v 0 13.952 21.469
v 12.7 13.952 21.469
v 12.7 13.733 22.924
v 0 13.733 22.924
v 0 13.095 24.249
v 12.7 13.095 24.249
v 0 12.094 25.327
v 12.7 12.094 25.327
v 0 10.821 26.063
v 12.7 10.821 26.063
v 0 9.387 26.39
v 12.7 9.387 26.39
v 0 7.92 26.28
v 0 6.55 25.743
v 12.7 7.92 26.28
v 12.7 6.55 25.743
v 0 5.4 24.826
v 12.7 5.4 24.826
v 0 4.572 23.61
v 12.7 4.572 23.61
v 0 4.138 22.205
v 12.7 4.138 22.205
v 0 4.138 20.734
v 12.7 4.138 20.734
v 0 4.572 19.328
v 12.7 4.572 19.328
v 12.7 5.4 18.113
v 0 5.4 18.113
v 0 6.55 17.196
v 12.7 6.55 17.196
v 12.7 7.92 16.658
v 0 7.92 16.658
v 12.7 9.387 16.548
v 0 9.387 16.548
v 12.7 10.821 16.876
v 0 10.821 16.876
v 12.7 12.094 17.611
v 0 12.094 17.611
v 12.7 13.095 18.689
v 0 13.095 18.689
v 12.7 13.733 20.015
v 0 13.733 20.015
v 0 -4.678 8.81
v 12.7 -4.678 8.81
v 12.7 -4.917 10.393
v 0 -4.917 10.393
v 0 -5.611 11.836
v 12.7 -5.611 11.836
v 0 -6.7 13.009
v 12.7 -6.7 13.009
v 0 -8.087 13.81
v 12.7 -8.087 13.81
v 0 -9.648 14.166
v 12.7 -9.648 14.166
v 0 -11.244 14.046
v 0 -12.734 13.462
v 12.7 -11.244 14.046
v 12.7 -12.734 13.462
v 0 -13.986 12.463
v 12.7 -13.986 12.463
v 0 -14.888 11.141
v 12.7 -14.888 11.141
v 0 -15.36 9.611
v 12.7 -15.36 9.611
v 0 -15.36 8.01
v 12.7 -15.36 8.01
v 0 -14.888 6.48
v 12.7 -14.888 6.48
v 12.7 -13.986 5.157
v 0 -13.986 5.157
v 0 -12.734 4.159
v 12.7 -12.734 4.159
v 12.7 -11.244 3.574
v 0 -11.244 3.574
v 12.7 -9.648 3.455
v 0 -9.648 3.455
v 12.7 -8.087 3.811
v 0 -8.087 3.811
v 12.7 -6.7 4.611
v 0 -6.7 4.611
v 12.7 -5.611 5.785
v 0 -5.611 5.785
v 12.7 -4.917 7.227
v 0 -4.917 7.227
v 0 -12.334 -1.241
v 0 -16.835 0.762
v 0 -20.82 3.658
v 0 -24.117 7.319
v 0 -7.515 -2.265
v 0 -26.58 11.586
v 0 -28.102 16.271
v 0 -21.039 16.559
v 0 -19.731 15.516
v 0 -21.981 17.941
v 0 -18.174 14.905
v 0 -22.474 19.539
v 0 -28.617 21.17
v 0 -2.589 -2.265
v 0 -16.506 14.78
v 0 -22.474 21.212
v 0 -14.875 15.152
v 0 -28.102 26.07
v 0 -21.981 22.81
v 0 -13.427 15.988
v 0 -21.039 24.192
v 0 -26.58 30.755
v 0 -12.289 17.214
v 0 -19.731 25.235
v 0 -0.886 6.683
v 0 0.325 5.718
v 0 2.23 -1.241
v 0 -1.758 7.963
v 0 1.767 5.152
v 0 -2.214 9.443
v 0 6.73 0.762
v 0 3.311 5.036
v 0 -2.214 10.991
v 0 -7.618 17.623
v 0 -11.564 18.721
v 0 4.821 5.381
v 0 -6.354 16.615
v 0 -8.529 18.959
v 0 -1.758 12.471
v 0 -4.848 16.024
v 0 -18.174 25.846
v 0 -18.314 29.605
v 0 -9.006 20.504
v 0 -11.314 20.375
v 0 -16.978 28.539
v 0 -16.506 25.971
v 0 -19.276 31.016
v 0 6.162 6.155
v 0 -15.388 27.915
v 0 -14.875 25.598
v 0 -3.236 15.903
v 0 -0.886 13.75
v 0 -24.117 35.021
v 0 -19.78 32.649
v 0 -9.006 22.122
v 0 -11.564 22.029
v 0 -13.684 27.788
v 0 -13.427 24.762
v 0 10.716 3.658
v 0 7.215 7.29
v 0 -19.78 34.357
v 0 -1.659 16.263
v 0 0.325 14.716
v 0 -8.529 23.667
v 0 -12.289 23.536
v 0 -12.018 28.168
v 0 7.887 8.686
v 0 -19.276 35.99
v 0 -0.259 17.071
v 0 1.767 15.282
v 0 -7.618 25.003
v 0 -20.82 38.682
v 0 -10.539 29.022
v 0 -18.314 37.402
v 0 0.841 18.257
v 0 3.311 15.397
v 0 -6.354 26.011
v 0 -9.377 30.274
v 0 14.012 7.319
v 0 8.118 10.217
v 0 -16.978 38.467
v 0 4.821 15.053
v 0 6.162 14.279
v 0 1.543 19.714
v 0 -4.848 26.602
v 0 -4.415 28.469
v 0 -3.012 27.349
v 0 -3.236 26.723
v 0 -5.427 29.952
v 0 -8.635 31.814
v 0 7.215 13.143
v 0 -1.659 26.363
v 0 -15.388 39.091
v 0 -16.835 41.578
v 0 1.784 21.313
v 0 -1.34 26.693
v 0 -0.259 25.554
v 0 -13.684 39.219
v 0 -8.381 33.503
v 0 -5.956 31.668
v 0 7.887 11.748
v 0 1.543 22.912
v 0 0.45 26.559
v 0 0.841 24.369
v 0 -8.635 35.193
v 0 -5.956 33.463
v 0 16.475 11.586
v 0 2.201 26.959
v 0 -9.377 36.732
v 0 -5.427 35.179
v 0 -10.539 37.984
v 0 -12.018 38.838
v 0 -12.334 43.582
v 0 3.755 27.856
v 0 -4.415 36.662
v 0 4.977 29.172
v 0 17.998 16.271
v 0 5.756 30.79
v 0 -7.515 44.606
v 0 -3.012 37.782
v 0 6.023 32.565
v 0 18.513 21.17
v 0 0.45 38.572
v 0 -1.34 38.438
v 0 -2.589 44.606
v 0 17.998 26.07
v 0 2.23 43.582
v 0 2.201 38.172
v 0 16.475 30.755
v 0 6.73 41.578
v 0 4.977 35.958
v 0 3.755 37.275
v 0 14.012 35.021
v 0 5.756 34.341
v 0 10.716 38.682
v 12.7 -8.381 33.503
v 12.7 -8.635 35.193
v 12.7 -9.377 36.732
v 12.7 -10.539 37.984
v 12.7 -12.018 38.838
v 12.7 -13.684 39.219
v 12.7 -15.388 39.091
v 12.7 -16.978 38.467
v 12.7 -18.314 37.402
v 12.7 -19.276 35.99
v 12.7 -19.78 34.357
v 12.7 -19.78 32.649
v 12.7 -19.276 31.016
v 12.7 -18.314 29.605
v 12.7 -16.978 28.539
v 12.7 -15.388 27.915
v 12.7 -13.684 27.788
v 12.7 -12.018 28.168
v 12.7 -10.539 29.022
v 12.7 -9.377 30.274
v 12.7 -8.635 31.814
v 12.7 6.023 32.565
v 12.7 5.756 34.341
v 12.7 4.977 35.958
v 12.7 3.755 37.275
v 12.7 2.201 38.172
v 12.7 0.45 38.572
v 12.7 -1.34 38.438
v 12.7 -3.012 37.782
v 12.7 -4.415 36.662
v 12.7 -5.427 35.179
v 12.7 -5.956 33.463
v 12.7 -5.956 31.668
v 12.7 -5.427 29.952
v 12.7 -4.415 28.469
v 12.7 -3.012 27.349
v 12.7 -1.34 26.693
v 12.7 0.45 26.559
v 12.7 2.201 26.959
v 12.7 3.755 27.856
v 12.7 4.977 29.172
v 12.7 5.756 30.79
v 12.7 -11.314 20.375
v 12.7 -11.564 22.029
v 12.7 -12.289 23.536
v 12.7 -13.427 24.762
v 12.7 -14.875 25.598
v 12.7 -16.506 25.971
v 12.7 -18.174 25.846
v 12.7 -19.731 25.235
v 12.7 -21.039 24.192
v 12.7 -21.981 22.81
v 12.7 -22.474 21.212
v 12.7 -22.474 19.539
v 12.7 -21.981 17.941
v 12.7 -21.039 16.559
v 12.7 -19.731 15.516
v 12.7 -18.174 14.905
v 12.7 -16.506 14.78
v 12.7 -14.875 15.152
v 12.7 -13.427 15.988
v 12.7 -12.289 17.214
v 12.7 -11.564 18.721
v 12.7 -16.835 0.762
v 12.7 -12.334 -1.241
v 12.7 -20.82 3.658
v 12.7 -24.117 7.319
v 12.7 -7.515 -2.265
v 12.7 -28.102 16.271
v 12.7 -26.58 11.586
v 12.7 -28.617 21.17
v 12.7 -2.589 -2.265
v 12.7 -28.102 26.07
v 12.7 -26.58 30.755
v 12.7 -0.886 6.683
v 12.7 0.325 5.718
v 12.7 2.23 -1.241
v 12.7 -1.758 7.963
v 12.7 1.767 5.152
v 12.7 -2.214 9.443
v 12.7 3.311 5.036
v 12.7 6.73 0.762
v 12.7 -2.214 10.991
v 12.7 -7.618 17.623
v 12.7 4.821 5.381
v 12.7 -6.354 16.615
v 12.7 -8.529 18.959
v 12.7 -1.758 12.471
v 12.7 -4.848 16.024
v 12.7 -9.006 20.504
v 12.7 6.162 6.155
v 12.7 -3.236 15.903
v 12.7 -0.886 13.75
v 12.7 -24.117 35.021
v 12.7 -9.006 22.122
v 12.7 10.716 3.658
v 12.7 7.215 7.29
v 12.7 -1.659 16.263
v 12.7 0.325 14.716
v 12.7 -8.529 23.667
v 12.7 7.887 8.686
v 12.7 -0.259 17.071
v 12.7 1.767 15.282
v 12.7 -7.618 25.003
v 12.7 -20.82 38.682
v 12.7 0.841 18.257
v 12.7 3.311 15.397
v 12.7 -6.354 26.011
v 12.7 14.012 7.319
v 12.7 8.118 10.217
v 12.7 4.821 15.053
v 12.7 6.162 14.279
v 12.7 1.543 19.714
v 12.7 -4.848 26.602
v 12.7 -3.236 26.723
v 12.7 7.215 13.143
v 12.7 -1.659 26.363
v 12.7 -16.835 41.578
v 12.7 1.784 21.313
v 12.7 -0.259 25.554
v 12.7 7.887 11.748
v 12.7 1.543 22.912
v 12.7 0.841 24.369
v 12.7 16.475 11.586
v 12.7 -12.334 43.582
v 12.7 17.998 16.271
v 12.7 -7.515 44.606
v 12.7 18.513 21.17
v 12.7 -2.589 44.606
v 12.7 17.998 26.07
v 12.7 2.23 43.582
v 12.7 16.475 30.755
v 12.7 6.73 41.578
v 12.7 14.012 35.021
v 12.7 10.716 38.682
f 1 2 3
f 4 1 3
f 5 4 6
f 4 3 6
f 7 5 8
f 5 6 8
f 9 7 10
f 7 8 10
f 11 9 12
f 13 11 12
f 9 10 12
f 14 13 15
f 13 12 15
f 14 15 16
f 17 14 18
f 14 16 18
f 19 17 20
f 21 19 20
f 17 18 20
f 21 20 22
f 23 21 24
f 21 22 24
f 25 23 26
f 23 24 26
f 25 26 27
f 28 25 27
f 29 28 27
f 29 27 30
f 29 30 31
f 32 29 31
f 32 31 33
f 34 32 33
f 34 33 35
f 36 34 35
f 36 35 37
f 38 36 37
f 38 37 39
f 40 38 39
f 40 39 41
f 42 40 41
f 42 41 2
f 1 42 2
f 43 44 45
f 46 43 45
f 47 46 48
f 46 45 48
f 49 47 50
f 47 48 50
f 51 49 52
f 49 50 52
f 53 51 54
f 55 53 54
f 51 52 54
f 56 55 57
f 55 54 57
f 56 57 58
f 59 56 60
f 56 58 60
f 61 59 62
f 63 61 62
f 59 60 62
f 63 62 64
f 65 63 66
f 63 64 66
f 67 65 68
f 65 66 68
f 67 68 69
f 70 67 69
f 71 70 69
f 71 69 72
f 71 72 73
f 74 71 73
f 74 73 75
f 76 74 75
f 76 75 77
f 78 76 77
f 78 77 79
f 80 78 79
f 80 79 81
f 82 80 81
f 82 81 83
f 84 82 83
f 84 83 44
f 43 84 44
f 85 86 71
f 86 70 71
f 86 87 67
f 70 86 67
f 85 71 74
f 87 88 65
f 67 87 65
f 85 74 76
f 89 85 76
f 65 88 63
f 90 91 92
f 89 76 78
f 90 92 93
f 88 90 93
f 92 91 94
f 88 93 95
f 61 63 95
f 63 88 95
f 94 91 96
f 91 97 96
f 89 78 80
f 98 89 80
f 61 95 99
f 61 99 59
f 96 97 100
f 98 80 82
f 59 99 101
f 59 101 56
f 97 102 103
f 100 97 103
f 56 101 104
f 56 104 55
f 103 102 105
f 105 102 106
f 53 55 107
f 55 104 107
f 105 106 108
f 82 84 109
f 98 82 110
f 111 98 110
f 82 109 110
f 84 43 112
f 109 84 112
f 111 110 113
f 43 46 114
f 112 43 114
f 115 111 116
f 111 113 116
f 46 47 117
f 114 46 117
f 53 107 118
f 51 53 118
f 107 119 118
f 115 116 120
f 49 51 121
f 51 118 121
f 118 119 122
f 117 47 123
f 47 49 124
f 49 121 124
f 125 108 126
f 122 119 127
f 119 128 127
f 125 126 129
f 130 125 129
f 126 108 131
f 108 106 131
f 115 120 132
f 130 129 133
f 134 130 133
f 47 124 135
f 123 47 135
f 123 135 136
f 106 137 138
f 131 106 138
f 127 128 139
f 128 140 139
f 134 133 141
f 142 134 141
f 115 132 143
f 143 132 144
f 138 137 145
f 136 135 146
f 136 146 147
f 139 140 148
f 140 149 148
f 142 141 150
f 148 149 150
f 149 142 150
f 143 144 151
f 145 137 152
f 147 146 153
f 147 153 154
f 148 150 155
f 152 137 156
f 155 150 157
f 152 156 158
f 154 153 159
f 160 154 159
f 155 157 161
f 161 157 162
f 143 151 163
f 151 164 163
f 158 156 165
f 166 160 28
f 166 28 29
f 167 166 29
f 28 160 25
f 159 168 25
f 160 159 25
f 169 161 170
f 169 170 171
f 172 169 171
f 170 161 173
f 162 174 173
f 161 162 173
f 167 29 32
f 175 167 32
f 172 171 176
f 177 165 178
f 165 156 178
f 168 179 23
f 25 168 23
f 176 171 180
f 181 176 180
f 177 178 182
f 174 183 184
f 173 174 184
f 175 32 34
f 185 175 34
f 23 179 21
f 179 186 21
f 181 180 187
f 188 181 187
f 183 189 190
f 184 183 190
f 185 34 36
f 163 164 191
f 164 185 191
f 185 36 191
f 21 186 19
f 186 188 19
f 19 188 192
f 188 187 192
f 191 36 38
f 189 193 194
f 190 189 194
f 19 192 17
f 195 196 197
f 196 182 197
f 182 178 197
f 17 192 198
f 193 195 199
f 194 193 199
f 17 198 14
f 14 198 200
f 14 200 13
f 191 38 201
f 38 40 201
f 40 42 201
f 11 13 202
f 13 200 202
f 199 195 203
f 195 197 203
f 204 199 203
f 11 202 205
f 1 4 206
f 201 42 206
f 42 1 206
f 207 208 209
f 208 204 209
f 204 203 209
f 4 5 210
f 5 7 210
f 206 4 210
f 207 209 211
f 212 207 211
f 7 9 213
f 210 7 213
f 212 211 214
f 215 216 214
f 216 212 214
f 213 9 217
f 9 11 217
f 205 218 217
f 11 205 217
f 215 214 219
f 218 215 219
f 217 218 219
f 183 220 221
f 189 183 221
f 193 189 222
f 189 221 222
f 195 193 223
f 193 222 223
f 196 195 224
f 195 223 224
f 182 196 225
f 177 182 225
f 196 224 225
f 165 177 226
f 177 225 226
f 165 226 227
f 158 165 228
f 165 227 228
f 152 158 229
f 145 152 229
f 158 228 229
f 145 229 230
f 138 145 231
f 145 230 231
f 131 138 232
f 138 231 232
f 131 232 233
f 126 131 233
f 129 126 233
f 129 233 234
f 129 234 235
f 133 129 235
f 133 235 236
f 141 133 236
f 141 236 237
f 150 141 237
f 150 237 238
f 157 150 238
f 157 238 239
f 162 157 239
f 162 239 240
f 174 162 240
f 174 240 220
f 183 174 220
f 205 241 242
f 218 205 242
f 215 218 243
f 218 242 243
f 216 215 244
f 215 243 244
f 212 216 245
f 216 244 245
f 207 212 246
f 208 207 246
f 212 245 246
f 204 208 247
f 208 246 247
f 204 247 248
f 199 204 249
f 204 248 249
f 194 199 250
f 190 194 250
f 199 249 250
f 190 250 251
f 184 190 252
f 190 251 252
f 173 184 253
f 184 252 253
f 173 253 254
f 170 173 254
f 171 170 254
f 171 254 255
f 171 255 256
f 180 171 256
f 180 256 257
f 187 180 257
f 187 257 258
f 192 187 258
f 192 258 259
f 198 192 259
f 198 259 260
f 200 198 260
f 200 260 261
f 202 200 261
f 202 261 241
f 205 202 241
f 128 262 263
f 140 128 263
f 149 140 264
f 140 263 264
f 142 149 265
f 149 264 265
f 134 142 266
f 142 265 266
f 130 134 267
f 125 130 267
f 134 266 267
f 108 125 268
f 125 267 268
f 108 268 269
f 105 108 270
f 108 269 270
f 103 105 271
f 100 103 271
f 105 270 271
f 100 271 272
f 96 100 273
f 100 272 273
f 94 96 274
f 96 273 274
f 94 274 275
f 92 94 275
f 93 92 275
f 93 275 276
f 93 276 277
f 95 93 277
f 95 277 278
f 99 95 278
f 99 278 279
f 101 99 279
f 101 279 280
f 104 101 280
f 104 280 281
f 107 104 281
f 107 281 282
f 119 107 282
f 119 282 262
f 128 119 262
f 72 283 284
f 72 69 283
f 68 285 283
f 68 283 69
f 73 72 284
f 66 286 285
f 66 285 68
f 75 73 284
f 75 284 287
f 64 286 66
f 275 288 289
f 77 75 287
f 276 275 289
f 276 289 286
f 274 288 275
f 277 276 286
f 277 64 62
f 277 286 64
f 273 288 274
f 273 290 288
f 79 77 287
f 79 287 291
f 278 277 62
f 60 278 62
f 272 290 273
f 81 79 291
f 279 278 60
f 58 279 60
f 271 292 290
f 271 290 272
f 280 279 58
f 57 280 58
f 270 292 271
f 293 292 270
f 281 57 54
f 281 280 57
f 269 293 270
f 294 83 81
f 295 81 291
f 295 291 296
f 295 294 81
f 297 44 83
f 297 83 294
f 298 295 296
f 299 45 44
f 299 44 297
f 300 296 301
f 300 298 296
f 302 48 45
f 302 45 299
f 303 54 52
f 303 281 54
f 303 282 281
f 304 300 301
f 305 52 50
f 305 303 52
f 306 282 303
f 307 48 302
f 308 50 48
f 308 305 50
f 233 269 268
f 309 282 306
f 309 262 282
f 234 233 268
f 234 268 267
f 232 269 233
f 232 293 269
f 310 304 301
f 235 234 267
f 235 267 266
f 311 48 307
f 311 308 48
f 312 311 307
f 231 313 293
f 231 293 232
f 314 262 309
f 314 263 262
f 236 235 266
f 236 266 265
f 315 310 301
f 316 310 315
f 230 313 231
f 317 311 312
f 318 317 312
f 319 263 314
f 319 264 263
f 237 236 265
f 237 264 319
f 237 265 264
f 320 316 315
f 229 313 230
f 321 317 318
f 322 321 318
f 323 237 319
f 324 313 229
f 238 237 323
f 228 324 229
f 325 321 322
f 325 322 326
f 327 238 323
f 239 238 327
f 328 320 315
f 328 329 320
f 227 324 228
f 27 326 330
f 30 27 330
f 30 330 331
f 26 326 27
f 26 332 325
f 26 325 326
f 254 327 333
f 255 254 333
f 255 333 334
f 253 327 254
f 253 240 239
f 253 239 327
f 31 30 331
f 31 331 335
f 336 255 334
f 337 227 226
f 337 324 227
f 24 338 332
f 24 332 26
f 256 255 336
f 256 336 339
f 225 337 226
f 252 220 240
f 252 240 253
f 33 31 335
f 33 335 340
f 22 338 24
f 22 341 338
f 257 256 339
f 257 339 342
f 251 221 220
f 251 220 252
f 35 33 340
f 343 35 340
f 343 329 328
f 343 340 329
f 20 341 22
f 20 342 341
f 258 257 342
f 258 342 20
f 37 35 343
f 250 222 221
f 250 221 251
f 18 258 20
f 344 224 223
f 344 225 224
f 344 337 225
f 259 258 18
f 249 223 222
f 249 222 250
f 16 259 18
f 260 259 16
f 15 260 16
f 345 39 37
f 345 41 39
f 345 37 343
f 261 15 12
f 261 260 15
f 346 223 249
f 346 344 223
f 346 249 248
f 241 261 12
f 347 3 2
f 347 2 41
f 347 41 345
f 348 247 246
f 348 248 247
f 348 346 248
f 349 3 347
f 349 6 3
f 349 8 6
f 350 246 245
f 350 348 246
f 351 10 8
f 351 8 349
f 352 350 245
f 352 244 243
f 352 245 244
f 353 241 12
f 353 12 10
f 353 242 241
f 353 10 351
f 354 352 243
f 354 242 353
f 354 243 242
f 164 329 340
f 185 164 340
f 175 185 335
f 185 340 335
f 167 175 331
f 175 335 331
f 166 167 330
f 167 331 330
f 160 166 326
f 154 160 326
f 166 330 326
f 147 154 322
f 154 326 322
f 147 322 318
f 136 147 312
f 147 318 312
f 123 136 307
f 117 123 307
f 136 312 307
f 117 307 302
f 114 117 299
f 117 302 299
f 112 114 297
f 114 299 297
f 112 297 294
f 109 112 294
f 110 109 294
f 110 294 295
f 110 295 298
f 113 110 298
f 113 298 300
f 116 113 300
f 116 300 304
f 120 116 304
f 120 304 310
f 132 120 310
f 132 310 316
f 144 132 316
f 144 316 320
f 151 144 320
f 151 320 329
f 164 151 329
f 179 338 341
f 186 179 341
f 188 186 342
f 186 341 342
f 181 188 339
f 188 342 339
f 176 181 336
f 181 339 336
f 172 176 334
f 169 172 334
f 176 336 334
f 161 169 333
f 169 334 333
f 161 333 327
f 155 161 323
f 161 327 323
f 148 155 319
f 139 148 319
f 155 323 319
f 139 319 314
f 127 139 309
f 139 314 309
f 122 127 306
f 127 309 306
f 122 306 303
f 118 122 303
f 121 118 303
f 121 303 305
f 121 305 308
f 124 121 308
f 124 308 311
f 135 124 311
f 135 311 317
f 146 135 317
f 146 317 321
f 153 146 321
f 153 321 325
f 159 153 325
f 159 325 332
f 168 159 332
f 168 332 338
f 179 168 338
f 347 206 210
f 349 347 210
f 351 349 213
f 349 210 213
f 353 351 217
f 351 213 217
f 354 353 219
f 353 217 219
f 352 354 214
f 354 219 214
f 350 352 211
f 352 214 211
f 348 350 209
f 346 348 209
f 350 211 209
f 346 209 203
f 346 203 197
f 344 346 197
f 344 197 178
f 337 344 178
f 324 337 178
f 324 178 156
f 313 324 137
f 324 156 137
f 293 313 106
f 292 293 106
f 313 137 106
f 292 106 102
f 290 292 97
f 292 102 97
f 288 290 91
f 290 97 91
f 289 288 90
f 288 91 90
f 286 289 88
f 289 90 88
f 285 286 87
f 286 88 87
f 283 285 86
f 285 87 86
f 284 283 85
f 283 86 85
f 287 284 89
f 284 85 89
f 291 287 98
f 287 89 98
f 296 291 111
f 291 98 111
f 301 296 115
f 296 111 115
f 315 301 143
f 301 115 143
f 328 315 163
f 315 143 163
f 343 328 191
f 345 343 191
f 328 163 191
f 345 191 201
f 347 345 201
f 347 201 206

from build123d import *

# Parameters (mm, degrees)
F0_R     = 23.564799
F1_DEPTH = 12.7
F2_R     = 5.731585
F2_R_2   = 6.023249
F2_R_3   = 5.610998
F2_R_4   = 5.425092
F2_R_5   = 4.934707
F2_R_6   = 5.195112
F2_R_7   = 5.370794
F3_DEPTH = 25.4


with BuildPart() as f1:
    # F0 (on Right) → F1 (new body)
    with BuildSketch(Plane.YZ):
        with Locations((-5.052262, 21.17021)):
            Circle(F0_R)
    extrude(amount=F1_DEPTH)

    # F2 (on face) → F3 (cut)
    with BuildSketch(Plane.YZ.offset(12.7)):
        with Locations((-14.112254, 33.503115)):
            Circle(F2_R)
        with Locations((0, 32.565415)):
            Circle(F2_R_2)
        with Locations((-16.925359, 20.375287)):
            Circle(F2_R_3)
        with Locations((-3.641246, 21.312989)):
            Circle(F2_R_4)
        with Locations((9.017731, 21.469273)):
            Circle(F2_R_5)
        with Locations((2.922666, 10.216848)):
            Circle(F2_R_6)
        with Locations((-10.048877, 8.810295)):
            Circle(F2_R_7)
    extrude(amount=-F3_DEPTH, mode=Mode.SUBTRACT)


solid = f1.part
